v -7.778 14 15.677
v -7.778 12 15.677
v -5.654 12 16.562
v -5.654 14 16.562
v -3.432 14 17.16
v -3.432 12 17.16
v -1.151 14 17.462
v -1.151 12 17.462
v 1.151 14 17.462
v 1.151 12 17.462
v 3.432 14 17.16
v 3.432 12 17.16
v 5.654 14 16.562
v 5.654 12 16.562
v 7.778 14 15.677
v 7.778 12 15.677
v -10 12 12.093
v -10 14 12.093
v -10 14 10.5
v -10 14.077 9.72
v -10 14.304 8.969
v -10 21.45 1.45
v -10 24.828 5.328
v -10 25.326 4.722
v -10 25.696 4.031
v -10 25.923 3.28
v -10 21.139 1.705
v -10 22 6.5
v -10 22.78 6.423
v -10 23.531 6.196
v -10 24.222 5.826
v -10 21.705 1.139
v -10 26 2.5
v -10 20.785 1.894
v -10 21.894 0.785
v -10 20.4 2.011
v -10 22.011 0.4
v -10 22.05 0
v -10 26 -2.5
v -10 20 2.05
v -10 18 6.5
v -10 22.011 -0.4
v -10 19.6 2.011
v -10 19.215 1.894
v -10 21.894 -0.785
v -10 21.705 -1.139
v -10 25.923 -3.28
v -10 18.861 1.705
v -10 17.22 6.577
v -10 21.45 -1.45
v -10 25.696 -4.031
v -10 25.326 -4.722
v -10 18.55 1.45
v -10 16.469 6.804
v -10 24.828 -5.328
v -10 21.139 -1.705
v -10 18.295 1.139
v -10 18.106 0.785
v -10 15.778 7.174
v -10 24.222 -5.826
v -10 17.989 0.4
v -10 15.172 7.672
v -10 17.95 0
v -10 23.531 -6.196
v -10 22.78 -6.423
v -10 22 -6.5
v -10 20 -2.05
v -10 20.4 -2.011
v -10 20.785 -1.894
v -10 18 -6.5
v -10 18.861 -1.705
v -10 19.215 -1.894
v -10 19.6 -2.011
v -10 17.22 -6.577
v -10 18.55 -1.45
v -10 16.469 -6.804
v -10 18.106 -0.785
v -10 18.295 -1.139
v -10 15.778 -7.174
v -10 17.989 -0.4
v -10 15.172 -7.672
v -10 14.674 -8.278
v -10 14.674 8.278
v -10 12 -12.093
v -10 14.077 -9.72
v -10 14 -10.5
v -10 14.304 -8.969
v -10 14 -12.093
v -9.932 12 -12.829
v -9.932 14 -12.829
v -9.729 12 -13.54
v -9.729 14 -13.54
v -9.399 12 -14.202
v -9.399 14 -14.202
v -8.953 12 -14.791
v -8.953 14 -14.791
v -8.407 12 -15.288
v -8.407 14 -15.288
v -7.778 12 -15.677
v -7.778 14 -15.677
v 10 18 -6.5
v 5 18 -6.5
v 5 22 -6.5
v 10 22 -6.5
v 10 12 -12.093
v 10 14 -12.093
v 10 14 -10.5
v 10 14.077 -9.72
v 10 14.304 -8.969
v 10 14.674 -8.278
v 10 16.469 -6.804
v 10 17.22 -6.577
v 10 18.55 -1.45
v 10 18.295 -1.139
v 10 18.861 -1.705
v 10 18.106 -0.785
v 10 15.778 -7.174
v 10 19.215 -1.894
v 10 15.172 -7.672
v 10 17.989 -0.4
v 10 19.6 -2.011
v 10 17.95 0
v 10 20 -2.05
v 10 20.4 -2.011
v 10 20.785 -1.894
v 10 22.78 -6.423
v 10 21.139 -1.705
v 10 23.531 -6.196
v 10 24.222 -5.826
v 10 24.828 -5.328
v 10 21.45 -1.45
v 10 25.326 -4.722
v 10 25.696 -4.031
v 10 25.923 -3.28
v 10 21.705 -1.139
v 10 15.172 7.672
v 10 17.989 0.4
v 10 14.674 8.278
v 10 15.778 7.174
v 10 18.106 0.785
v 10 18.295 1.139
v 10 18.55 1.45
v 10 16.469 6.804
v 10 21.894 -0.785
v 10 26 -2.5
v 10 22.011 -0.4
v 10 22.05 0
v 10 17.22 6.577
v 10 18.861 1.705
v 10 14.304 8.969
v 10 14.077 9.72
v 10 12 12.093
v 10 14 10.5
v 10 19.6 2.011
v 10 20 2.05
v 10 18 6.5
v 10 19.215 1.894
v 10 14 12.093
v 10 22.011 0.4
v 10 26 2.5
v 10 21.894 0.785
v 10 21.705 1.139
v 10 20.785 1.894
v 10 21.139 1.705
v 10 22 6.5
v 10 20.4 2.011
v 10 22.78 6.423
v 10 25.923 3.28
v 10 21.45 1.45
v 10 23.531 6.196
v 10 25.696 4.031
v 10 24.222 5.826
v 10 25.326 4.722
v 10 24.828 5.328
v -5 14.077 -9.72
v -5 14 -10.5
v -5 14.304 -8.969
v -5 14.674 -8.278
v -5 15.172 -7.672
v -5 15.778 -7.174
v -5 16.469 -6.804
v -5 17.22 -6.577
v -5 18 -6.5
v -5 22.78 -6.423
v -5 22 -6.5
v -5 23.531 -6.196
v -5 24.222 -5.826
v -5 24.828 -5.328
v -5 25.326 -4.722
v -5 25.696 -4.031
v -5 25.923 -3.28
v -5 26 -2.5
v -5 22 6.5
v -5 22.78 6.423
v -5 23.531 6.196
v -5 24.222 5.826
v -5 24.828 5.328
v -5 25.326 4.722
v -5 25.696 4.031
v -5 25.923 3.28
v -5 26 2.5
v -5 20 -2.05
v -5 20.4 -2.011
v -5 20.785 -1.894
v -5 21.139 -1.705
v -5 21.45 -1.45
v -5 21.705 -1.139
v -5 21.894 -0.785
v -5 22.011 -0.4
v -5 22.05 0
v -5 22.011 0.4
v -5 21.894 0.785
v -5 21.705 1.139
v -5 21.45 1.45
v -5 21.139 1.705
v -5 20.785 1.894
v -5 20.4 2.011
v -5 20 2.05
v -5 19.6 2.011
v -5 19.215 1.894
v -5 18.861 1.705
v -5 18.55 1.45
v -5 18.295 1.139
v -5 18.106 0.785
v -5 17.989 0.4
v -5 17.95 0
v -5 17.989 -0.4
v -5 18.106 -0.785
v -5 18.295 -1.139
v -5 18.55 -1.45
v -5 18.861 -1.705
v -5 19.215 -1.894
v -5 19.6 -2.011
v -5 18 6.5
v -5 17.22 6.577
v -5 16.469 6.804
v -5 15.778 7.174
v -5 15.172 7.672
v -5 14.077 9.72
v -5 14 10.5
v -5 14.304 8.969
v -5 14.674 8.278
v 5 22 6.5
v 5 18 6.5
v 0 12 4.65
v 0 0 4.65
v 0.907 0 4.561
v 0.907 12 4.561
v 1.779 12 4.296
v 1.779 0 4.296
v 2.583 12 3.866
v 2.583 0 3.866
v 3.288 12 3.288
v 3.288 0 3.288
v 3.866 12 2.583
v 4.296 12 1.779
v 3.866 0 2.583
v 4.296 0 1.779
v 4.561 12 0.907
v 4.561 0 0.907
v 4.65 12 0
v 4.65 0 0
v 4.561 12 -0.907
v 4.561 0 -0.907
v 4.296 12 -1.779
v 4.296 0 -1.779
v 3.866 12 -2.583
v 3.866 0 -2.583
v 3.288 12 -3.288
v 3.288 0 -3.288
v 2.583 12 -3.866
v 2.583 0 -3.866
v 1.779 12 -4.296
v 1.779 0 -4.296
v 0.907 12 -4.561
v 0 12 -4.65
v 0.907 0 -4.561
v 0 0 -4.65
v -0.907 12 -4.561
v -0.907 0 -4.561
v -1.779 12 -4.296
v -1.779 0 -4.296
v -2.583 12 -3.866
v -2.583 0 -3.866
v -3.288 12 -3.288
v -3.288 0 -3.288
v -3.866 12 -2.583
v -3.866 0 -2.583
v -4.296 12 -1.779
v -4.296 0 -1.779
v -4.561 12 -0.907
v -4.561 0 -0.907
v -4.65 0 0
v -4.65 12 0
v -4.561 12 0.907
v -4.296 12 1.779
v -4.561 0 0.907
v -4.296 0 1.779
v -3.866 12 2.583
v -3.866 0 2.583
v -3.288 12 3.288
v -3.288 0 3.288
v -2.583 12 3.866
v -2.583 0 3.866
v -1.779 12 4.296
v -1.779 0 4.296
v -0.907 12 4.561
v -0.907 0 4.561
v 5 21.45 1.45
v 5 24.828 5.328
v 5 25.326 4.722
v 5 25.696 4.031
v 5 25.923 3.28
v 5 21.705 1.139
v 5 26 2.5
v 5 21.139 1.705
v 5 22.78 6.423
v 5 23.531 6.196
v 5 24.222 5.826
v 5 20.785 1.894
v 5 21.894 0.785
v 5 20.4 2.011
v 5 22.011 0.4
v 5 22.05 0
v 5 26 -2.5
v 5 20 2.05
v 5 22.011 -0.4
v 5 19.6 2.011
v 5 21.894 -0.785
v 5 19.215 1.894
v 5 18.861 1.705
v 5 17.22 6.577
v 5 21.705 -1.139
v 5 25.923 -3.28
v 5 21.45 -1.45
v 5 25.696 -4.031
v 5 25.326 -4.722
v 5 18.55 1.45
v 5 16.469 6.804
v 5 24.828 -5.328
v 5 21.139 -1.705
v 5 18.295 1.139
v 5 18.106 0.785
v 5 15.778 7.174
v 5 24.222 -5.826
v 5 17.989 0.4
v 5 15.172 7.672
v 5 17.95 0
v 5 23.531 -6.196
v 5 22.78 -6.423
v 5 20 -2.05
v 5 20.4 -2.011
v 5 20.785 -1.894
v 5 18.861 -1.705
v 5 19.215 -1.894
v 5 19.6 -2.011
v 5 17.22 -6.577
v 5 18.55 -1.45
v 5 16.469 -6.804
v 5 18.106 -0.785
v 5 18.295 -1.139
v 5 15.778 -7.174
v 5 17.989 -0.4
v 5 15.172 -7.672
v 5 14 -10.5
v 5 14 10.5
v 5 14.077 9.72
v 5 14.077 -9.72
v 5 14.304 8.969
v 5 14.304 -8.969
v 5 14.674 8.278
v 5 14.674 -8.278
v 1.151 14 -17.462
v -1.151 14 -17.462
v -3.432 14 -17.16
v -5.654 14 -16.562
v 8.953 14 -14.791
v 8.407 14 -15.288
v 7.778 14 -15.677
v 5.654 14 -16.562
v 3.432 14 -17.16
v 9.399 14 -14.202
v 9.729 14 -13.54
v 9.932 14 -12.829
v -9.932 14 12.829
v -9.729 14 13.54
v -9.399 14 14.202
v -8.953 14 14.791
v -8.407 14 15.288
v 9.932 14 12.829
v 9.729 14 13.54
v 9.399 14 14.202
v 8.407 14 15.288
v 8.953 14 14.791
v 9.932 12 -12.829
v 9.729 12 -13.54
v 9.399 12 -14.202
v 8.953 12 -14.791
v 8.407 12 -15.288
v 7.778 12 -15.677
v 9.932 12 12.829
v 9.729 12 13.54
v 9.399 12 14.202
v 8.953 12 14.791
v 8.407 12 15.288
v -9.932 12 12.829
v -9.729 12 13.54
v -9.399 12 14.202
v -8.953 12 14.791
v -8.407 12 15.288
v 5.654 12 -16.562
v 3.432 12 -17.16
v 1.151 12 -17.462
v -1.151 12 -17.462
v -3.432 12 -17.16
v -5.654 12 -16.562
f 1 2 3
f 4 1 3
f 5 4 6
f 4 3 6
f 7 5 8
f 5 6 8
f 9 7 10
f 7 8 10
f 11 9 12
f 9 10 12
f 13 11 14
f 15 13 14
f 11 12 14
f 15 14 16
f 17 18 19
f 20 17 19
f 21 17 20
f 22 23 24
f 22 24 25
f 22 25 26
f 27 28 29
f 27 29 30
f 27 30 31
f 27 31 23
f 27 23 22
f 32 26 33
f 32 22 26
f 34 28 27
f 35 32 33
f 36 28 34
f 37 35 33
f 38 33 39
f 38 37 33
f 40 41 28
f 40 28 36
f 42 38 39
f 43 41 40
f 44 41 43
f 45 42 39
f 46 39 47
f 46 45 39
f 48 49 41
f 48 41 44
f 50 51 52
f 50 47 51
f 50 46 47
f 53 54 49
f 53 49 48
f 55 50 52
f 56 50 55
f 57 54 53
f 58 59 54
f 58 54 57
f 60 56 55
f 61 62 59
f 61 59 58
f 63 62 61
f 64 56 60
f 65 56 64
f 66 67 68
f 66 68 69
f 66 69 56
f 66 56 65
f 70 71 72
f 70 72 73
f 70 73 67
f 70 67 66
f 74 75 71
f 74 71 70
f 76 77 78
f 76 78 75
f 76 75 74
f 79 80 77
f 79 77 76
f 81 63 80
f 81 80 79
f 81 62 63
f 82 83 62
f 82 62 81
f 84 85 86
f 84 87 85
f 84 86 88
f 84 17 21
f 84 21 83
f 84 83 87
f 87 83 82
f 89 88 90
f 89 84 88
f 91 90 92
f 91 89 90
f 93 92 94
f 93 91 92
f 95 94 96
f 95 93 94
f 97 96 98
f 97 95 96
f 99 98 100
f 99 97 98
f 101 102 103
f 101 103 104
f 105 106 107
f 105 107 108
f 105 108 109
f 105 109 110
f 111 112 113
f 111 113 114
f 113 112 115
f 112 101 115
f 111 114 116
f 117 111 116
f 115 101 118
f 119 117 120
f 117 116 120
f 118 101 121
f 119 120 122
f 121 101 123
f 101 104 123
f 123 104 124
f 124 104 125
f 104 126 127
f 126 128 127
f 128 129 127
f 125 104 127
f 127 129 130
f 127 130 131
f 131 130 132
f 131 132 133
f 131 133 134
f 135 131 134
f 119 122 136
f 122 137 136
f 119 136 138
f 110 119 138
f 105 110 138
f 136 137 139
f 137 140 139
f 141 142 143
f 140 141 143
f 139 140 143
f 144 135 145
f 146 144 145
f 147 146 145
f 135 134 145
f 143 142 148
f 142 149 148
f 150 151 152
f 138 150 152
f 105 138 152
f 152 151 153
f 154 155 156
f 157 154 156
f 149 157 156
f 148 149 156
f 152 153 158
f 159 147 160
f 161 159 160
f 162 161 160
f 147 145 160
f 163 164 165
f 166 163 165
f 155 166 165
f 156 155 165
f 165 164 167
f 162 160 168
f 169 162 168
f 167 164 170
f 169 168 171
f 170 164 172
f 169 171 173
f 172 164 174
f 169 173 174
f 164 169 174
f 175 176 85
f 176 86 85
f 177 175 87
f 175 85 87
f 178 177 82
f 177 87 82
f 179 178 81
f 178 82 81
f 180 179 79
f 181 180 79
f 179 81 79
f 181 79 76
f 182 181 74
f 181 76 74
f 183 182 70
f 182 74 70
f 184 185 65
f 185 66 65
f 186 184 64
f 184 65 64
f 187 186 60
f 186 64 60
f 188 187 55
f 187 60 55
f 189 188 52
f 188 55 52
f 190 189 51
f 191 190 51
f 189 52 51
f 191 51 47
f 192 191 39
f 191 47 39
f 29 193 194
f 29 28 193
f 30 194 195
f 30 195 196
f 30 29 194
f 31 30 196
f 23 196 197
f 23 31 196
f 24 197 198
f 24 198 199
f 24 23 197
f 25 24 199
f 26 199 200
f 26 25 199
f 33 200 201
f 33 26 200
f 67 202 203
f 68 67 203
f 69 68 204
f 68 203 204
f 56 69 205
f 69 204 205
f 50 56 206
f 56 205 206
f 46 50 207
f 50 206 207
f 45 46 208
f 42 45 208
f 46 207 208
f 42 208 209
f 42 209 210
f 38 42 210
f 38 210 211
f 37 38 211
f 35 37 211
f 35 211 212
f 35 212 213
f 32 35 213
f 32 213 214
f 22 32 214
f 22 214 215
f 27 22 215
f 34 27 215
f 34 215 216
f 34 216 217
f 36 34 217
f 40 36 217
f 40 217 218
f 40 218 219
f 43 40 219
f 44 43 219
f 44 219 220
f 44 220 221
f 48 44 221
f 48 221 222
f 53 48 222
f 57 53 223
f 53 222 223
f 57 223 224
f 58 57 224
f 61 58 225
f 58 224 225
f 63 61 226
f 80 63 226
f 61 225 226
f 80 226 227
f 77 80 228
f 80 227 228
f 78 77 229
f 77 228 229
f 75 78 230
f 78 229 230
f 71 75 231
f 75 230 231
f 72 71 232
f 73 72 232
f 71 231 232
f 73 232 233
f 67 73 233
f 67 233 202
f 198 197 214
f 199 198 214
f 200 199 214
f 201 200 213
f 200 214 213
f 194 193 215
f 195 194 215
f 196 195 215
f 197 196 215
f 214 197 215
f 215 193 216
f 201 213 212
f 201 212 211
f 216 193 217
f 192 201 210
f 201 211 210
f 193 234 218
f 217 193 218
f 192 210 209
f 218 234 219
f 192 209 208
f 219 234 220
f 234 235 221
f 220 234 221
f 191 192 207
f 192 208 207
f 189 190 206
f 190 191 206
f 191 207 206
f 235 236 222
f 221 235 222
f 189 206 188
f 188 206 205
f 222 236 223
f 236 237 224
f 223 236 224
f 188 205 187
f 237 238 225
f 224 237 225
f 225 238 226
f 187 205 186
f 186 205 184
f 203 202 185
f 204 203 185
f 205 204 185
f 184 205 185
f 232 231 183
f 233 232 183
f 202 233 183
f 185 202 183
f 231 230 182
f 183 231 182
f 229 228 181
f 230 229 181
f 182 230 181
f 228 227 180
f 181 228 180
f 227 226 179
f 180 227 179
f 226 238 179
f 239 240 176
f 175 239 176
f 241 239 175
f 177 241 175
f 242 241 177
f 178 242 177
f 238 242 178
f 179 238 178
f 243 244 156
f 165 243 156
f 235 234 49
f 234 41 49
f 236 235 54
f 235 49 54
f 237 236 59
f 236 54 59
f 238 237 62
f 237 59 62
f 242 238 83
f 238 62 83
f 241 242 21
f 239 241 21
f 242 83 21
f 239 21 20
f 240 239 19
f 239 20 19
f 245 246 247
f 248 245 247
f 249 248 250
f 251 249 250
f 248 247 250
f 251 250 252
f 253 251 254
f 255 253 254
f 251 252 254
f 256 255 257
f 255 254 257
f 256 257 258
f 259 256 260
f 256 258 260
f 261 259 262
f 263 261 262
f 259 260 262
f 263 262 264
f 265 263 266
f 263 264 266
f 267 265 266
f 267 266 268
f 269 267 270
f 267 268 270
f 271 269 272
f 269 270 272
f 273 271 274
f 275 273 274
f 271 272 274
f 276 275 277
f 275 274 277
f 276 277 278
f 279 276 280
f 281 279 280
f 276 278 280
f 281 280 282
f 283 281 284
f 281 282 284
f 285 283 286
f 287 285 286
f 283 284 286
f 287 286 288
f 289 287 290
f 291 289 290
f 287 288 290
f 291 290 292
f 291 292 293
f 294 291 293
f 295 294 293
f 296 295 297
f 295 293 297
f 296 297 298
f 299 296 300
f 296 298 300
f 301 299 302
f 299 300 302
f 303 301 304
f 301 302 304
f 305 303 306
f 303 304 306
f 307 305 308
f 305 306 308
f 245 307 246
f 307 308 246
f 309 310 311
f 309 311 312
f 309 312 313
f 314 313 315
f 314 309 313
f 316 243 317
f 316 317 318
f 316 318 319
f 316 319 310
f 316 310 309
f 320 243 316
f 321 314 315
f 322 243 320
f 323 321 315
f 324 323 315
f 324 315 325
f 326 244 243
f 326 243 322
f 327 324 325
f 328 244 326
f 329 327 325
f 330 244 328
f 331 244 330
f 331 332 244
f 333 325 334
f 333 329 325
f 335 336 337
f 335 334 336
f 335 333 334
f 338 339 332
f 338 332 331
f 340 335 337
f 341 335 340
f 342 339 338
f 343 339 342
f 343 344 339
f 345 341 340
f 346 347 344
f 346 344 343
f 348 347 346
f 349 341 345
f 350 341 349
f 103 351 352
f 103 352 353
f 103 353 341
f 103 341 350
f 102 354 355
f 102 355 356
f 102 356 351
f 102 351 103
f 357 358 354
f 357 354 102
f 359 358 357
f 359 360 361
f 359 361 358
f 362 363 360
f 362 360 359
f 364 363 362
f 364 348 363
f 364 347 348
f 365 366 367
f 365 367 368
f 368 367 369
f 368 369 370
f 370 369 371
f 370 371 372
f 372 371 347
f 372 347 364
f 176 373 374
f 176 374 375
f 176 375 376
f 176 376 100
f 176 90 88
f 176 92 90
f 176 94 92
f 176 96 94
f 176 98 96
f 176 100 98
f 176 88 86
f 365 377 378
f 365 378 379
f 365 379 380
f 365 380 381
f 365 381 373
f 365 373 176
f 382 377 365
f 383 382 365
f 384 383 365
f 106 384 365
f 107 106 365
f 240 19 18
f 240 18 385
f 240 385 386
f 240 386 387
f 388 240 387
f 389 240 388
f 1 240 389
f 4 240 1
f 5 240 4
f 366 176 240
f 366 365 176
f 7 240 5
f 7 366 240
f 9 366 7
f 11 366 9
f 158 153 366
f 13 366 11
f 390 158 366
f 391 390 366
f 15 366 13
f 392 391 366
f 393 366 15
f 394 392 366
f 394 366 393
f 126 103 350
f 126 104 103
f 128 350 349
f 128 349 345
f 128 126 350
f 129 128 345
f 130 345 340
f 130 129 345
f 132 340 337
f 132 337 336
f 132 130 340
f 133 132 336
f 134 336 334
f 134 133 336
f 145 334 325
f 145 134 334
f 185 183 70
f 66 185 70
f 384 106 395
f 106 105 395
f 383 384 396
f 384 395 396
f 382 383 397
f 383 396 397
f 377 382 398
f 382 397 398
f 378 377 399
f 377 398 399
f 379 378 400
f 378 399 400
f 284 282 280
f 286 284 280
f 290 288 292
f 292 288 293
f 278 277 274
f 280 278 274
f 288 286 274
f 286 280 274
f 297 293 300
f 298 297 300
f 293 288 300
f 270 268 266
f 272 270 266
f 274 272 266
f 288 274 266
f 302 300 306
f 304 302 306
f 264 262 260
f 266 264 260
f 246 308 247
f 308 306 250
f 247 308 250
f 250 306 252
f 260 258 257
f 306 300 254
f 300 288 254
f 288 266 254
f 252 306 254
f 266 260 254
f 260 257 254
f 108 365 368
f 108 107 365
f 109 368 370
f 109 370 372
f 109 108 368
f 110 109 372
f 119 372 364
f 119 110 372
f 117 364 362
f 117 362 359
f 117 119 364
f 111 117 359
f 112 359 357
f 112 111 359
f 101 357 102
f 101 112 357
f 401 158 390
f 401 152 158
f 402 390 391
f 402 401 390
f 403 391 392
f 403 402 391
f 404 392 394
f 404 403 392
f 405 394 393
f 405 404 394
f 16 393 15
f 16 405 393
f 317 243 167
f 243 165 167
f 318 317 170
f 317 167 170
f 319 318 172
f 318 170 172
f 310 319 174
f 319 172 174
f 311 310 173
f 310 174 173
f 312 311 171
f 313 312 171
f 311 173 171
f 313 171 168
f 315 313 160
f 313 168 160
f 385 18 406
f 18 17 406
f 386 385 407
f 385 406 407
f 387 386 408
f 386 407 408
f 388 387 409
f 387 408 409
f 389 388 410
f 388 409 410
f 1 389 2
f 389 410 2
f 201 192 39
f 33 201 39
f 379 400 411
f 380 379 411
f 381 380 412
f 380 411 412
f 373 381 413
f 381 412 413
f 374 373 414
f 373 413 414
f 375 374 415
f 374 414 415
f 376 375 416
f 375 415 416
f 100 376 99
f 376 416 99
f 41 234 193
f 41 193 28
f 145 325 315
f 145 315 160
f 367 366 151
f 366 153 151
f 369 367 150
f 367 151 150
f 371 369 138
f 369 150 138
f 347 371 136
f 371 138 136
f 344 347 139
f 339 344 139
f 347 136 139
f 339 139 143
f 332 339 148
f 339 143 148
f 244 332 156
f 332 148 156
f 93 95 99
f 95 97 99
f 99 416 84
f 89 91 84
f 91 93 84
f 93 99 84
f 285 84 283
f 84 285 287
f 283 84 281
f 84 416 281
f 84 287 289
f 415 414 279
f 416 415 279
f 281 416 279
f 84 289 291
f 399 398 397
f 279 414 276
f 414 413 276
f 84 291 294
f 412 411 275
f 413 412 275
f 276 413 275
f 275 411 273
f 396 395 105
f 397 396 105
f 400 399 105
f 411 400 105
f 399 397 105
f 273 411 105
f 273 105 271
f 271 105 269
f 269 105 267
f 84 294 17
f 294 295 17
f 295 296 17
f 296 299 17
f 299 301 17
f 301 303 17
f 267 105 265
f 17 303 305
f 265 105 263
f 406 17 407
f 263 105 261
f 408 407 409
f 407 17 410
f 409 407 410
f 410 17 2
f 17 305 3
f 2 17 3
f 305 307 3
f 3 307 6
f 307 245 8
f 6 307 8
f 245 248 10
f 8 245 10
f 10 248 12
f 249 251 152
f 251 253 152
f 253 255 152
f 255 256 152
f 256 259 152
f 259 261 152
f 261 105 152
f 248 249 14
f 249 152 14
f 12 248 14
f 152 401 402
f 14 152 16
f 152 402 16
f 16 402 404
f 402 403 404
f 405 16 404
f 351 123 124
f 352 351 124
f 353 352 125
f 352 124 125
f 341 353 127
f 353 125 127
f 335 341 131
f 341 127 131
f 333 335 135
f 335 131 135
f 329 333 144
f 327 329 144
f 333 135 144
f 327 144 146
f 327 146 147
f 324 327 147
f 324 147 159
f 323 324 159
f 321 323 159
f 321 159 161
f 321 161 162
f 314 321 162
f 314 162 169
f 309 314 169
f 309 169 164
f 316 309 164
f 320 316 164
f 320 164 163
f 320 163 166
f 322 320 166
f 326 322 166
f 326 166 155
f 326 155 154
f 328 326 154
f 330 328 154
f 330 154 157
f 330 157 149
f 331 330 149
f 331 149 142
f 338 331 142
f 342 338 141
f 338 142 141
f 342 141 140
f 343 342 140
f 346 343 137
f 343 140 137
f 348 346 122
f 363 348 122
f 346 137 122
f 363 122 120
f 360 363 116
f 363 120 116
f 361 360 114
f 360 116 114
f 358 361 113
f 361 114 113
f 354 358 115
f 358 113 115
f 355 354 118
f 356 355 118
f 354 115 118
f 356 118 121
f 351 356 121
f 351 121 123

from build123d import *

# Parameters (mm, degrees)
SKETCH1_R           = 4.65
BOSS_EXTRUDE1_DEPTH = 12
SKETCH2_R           = 17.5
BOSS_EXTRUDE2_DEPTH = 2
SKETCH3_W           = 5
SKETCH3_H           = 13
BOSS_EXTRUDE3_DEPTH = 12
FILLET1_R           = 4
FILLET2_R           = 4
CUT_EXTRUDE1_DEPTH  = 29.434134416
SKETCH5_R           = 2.05
CUT_EXTRUDE2_DEPTH  = 70
FILLET3_R           = 4


with BuildPart() as part:
    # Sketch1 → Boss-Extrude1 (new body)
    with BuildSketch(Plane(origin=(0, 0, 0), x_dir=(1, 0, 0), z_dir=(0, 1, 0))):
        with Locations(Location((0, 0, 0), (0, 0, 270))):
            Circle(SKETCH1_R)
    extrude(amount=BOSS_EXTRUDE1_DEPTH)

    # Sketch2 → Boss-Extrude2 (add)
    with BuildSketch(Plane(origin=(0, 12, 0), x_dir=(1, 0, 0), z_dir=(0, 1, 0))):
        with Locations(Location((0, 0, 0), (0, 0, 270))):
            Circle(SKETCH2_R)
    extrude(amount=BOSS_EXTRUDE2_DEPTH)

    # Sketch3 → Boss-Extrude3 (add)
    with BuildSketch(Plane(origin=(0, 14, 0), x_dir=(1, 0, 0), z_dir=(0, 1, 0))):
        with Locations((7.5, 0)):
            Rectangle(SKETCH3_W, SKETCH3_H)
    boss_extrude3 = extrude(amount=BOSS_EXTRUDE3_DEPTH)

    # Mirror1: Boss-Extrude3 across plane
    add(boss_extrude3.mirror(Plane(origin=(0, 0, 0), x_dir=(0, 0, 1), z_dir=(1, 0, 0))))

    # Fillet1
    fillet1_edges = [part.edges().sort_by_distance(p)[0] for p in [
        (7.5, 26, -6.5),
        (7.5, 26, 6.5),
        (-7.5, 26, 6.5),
        (-7.5, 26, -6.5),
    ]]
    fillet(fillet1_edges, radius=FILLET1_R)

    # Fillet2
    fillet2_edges = [part.edges().sort_by_distance(p)[0] for p in [
        (7.5, 14, 6.5),
        (7.5, 14, -6.5),
        (-7.5, 14, -6.5),
        (-7.5, 14, 6.5),
    ]]
    fillet(fillet2_edges, radius=FILLET2_R)

    # Sketch4 → Cut-Extrude1 (cut, through all)
    with BuildSketch(Plane(origin=(0, 14, 0), x_dir=(1, 0, 0), z_dir=(0, 1, 0))):
        with BuildLine():
            Line((10, 14.361406616), (10, 0))
            Line((10, 0), (10, -14.361406616))
            ThreePointArc((10, -14.361406616), (15.512092057, -8.100925873), (17.5, 0))
            ThreePointArc((17.5, 0), (15.512092057, 8.100925873), (10, 14.361406616))
        make_face()
    cut_extrude1 = extrude(amount=-CUT_EXTRUDE1_DEPTH, mode=Mode.SUBTRACT)

    # Mirror2: Cut-Extrude1 across plane
    add(cut_extrude1.mirror(Plane(origin=(0, 0, 0), x_dir=(0, 0, 1), z_dir=(1, 0, 0))), mode=Mode.SUBTRACT)

    # Sketch5 → Cut-Extrude2 (cut)
    with BuildSketch(Plane(origin=(10, 0, 0), x_dir=(0, 0, -1), z_dir=(1, 0, 0))):
        with Locations((0, 20)):
            Circle(SKETCH5_R)
    extrude(amount=-CUT_EXTRUDE2_DEPTH, mode=Mode.SUBTRACT)

    # Fillet3
    fillet3_edges = [part.edges().sort_by_distance(p)[0] for p in [
        (10, 13, -14.361406616),
        (10, 13, 14.361406616),
        (-10, 13, 14.361406616),
        (-10, 13, -14.361406616),
    ]]
    fillet(fillet3_edges, radius=FILLET3_R)


solid = part.part
